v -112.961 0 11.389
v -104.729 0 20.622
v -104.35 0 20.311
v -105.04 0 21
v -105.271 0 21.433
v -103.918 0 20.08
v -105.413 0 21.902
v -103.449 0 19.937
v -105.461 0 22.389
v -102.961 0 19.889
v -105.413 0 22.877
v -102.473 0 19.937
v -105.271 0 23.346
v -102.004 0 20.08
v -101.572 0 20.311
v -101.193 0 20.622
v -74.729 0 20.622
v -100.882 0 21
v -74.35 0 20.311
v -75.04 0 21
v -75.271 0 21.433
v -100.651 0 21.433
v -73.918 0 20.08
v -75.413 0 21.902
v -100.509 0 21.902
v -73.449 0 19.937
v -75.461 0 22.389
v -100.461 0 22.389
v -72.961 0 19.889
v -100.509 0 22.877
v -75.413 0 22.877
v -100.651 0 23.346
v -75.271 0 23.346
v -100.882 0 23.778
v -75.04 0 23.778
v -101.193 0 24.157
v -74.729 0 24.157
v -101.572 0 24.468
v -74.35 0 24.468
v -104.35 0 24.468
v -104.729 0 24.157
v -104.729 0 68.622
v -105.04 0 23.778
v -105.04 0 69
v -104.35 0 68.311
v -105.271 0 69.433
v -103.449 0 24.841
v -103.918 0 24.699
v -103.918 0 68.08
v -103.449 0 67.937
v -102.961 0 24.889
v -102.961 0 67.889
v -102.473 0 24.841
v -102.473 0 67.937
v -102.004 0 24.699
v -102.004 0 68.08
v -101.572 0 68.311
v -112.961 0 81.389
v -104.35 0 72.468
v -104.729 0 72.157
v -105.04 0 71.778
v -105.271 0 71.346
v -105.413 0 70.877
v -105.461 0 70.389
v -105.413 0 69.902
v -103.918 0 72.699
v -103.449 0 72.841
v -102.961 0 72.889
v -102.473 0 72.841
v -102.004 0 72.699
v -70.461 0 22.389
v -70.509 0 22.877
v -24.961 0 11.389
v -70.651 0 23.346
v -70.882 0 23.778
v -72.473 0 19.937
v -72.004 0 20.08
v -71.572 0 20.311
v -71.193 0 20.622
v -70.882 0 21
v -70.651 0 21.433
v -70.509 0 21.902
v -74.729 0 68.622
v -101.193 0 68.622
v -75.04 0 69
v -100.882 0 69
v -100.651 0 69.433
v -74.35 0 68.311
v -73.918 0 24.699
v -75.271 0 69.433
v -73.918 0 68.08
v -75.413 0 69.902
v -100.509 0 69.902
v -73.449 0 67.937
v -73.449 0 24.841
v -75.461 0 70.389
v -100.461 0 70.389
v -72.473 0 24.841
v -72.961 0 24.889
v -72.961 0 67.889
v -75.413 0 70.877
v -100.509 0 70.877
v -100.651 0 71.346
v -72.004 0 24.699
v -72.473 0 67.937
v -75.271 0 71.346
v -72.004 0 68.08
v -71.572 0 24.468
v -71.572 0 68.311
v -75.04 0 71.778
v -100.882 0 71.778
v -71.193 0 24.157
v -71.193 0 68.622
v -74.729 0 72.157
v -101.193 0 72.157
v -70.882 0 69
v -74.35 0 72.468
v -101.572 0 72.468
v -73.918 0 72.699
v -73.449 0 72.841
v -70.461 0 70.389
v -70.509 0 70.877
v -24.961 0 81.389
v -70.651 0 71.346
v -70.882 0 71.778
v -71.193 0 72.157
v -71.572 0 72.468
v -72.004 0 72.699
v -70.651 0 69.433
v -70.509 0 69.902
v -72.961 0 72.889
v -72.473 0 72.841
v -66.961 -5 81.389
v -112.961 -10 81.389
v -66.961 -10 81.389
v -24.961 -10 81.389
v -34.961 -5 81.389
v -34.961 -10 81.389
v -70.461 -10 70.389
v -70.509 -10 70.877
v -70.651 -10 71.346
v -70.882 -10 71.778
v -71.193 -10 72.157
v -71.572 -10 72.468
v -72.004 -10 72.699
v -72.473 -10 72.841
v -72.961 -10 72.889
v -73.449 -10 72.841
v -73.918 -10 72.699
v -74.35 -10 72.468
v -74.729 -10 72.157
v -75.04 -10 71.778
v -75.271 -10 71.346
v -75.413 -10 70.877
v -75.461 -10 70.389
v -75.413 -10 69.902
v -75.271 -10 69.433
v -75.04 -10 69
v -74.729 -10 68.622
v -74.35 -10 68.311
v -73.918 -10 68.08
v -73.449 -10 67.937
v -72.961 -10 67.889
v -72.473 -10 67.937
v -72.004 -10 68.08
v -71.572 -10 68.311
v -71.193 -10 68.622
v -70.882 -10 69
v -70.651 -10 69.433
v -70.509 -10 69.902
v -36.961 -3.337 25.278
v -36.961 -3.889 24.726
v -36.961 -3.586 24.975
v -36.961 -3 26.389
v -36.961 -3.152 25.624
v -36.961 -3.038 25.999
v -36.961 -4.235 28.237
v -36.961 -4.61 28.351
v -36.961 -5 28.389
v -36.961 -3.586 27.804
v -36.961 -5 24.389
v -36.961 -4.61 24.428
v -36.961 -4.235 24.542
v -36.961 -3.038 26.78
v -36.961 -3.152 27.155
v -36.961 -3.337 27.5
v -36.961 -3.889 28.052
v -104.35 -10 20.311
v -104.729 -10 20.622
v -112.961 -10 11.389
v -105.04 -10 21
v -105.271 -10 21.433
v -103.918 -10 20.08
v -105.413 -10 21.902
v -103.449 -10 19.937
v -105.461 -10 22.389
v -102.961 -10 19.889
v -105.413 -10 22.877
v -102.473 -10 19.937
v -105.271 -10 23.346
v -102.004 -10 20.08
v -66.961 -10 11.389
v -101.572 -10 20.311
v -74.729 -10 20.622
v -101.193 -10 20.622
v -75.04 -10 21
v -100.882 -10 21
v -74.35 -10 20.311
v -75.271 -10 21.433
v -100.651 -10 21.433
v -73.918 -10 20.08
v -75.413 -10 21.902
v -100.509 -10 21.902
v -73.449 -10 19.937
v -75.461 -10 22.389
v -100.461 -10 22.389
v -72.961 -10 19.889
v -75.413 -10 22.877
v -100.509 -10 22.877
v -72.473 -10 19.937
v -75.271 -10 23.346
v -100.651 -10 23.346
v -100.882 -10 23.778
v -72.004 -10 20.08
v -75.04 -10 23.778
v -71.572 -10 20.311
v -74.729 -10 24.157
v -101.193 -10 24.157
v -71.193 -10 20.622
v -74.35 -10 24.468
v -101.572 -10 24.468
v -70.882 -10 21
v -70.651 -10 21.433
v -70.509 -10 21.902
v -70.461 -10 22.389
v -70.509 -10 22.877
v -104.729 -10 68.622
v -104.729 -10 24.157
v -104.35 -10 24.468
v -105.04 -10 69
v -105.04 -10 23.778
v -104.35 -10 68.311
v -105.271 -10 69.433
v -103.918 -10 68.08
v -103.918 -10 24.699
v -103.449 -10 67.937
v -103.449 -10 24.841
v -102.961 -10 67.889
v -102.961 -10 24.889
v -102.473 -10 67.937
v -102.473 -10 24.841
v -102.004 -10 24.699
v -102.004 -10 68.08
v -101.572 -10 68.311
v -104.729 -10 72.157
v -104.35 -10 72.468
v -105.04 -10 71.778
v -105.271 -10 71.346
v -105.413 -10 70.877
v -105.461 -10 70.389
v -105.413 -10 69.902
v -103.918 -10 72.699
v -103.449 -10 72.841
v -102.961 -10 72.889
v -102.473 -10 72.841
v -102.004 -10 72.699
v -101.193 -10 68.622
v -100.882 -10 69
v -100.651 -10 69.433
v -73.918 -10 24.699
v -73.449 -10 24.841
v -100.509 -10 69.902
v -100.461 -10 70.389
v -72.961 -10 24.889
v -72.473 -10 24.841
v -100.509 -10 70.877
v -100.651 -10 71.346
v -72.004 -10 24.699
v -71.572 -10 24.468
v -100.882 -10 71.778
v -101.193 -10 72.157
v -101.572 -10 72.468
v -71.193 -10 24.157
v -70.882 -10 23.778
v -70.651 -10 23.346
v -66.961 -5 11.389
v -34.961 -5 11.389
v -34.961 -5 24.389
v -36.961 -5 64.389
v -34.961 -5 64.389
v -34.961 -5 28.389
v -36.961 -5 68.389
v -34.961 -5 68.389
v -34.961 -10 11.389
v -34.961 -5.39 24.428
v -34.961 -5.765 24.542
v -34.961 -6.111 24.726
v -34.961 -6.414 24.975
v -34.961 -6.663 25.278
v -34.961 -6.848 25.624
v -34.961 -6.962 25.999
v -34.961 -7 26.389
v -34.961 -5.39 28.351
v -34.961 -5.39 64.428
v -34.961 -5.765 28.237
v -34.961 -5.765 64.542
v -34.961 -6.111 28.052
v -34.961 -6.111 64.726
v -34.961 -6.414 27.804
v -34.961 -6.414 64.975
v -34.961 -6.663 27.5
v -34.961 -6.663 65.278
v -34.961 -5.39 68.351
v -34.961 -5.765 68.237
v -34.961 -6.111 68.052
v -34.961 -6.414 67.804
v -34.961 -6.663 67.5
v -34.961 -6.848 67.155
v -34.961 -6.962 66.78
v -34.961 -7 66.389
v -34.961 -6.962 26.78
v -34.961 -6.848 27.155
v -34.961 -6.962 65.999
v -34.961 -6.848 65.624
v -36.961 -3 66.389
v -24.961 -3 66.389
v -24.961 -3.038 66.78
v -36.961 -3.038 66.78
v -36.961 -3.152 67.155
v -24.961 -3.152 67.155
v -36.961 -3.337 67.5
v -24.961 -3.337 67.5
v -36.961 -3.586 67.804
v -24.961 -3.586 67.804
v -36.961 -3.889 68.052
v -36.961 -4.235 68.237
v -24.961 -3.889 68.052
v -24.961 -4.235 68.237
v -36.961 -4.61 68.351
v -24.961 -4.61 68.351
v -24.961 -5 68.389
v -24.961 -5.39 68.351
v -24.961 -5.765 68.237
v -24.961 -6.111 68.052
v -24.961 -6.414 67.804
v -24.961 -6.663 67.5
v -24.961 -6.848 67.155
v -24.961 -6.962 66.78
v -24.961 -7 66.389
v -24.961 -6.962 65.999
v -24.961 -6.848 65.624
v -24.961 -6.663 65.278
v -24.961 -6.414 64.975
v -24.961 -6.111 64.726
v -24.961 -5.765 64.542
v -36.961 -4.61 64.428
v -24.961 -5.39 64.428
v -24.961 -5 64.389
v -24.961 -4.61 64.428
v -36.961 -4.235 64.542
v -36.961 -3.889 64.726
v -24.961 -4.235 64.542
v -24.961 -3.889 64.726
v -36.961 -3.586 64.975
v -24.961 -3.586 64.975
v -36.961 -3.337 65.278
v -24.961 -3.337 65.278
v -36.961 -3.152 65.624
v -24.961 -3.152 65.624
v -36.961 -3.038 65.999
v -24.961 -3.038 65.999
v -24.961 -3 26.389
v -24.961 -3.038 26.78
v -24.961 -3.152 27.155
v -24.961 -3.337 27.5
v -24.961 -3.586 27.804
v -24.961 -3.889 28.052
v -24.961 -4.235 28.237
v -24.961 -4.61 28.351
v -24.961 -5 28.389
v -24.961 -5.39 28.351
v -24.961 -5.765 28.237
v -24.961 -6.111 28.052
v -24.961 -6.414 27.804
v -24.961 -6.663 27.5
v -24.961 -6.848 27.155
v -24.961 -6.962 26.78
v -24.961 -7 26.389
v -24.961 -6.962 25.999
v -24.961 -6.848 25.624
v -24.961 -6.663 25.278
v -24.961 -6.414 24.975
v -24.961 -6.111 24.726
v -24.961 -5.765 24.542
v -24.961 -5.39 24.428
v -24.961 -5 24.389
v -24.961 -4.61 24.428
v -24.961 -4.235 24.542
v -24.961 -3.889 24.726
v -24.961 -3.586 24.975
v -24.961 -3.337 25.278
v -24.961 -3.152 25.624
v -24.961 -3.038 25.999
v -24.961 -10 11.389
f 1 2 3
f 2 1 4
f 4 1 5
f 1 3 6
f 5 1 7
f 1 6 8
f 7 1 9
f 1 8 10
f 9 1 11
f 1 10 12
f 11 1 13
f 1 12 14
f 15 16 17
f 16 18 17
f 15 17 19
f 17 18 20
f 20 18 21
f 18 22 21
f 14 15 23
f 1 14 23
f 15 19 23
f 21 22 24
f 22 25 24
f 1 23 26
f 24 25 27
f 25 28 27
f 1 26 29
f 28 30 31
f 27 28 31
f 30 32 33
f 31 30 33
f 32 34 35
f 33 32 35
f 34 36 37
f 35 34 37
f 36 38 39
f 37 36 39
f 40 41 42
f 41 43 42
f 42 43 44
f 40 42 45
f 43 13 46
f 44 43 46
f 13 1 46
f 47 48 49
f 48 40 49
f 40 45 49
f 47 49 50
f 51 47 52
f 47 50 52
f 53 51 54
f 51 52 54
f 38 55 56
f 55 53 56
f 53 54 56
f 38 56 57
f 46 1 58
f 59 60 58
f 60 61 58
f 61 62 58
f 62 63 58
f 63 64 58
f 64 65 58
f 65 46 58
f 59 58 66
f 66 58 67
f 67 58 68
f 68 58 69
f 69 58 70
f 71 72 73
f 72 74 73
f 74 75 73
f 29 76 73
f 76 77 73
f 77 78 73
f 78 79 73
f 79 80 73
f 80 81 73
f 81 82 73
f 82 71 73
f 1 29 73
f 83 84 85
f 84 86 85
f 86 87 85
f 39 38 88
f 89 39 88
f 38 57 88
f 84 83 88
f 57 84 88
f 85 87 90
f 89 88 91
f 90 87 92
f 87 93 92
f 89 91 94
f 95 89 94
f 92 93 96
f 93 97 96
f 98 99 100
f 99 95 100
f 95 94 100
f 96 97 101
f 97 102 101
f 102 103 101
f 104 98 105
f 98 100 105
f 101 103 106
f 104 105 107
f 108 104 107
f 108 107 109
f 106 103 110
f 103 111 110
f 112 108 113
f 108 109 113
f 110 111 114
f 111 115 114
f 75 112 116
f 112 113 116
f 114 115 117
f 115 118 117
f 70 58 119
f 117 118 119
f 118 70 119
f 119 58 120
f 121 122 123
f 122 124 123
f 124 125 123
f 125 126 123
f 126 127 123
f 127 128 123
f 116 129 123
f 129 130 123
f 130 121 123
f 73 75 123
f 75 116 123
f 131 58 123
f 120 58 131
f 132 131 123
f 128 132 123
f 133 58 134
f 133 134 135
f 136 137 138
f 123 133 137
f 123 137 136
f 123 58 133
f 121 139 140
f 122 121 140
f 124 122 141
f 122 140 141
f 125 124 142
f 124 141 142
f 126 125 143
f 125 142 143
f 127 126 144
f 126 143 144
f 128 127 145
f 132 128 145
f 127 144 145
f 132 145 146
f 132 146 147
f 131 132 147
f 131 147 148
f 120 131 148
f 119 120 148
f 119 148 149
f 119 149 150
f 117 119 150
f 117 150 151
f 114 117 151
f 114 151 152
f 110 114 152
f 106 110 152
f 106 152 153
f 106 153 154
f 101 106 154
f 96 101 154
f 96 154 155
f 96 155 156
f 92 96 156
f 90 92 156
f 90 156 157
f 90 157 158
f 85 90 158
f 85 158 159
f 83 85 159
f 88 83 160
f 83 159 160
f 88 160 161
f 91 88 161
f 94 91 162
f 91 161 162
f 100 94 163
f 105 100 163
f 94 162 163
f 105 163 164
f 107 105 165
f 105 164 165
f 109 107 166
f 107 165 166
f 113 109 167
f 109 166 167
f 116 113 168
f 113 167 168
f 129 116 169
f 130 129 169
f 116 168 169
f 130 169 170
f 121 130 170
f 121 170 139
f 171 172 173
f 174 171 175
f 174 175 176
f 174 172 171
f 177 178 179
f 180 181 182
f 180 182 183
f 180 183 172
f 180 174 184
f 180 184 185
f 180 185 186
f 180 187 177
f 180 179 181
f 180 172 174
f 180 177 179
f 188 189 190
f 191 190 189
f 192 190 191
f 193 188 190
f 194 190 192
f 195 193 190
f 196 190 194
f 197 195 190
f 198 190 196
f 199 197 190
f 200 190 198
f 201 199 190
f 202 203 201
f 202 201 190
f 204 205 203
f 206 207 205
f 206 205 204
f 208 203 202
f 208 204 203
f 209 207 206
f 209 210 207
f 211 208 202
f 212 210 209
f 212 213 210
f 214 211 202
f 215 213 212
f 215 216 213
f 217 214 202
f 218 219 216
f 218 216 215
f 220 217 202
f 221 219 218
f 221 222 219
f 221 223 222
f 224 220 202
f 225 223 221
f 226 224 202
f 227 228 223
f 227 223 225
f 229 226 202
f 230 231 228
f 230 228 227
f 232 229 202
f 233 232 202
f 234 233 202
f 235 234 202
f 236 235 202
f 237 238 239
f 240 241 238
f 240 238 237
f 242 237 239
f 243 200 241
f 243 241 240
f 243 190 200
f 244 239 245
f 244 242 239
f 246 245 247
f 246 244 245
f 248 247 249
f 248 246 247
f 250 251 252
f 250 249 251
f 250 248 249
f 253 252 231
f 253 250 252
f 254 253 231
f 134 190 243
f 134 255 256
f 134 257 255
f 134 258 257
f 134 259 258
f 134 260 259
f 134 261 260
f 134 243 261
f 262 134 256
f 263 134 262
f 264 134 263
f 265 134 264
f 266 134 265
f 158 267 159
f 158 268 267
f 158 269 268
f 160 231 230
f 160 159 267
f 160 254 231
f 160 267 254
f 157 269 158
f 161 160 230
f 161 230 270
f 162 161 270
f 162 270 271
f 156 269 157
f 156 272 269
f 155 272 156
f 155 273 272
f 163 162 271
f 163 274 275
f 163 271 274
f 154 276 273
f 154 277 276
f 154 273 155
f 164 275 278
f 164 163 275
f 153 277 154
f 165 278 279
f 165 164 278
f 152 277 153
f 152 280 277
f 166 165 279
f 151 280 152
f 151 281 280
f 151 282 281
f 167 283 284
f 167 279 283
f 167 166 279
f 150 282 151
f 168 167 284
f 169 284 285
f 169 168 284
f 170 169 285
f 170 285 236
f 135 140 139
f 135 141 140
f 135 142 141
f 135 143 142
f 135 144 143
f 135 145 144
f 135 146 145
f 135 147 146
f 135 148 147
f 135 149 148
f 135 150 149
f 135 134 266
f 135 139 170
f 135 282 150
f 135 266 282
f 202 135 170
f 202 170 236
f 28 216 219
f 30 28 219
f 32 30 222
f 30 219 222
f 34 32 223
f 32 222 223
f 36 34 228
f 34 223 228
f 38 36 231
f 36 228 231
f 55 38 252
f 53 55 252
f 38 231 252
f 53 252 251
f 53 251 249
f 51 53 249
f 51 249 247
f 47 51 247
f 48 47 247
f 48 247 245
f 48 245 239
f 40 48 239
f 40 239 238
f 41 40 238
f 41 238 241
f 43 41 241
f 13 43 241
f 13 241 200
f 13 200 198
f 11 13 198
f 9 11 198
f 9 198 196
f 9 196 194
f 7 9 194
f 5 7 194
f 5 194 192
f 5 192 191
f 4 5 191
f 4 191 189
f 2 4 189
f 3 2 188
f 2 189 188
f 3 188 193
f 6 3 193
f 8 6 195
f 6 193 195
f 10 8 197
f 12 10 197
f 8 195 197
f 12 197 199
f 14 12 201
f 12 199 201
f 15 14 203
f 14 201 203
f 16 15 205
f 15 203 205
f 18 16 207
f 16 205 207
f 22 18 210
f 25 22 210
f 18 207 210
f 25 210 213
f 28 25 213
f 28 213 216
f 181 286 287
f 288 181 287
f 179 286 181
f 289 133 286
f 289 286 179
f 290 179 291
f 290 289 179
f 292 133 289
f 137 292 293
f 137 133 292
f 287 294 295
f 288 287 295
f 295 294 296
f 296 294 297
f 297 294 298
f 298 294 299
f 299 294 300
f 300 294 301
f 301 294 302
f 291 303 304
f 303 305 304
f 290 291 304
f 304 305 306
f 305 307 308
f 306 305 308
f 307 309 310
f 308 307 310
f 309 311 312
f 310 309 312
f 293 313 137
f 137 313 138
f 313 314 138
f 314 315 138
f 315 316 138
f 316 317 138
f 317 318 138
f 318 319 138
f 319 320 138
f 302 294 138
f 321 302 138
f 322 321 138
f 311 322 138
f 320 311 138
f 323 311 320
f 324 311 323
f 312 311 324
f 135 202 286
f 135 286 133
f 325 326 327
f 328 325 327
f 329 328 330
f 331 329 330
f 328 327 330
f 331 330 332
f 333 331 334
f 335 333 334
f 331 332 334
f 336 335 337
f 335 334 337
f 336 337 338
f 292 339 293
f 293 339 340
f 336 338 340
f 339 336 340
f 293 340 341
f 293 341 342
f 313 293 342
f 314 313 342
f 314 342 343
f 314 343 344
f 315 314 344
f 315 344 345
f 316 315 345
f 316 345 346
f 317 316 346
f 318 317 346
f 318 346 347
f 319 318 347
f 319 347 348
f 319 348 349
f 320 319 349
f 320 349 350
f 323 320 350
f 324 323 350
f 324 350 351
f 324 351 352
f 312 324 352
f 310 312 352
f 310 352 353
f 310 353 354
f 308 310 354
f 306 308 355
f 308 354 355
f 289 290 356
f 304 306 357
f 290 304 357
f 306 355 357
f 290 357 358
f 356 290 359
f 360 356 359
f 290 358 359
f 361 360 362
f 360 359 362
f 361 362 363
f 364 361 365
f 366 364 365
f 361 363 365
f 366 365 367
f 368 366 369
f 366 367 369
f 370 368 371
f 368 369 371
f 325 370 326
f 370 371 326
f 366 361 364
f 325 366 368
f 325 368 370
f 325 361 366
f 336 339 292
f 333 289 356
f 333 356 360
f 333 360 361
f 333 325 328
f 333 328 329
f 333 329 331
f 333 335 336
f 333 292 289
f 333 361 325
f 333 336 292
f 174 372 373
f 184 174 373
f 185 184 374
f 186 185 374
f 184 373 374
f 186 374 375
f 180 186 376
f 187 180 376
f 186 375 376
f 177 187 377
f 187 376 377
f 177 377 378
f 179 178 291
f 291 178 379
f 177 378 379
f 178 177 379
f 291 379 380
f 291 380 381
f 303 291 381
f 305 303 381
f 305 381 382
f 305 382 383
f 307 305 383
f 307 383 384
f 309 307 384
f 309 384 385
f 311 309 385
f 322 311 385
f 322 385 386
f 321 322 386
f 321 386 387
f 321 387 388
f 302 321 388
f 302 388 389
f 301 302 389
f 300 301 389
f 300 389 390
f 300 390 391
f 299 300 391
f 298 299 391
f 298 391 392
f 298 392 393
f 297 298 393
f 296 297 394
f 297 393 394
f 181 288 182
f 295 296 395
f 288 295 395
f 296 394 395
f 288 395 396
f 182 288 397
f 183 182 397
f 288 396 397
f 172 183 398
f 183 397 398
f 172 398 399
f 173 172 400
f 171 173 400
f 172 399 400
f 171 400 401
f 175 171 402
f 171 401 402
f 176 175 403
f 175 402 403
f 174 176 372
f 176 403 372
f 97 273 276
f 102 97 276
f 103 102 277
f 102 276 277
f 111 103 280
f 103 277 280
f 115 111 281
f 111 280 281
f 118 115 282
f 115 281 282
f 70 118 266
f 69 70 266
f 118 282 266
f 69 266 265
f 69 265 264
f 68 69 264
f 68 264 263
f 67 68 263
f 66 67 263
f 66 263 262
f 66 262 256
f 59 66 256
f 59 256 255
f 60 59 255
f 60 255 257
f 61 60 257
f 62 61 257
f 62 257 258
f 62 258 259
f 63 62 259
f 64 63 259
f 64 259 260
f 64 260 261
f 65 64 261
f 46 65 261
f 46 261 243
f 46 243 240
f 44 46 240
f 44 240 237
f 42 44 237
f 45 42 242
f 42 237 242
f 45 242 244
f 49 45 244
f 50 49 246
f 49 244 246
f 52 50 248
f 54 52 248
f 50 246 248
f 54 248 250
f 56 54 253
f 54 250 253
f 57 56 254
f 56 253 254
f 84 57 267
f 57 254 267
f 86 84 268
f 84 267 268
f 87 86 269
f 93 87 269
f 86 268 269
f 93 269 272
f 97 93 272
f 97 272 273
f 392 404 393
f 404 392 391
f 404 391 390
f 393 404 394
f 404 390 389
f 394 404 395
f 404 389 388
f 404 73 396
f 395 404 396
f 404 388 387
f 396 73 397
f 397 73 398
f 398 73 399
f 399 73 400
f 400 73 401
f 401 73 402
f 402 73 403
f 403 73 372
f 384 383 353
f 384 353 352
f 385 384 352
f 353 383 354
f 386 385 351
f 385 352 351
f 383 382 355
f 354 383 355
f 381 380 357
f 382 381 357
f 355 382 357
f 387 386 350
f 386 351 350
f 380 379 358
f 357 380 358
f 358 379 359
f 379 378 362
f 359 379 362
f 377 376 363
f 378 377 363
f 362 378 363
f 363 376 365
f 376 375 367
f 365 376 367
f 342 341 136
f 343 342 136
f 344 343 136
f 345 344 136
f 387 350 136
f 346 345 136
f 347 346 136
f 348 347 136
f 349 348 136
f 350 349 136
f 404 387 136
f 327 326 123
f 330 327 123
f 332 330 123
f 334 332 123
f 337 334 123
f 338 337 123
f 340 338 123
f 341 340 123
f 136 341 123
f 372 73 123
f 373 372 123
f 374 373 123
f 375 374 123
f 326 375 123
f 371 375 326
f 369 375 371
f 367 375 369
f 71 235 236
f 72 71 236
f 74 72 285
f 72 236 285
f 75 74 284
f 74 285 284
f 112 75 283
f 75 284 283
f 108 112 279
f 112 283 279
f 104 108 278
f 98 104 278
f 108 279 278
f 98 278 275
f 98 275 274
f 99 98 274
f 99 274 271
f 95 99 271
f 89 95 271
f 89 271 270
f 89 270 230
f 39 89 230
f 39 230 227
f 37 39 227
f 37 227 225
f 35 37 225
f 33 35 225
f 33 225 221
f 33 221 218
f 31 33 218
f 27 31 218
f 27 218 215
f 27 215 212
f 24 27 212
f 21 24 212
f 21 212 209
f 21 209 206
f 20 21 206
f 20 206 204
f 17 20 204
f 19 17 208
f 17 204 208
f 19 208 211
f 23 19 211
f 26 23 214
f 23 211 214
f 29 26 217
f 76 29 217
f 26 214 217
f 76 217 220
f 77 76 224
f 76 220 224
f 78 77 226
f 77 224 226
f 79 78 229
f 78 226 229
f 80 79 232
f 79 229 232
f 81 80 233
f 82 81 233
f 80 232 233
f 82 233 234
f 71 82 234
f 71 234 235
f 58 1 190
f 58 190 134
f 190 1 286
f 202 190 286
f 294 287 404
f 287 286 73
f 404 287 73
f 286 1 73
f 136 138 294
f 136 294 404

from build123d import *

# Parameters (mm, degrees)
F0_W     = 88
F0_H     = 70
F1_DEPTH = 10
F2_W     = 32
F2_H     = 70
F3_DEPTH = 5
F2_R     = 2.5
F4_DEPTH = 10.001
F5_R     = 2
F6_DEPTH = 12


with BuildPart() as f1:
    # F0 (on Front) → F1 (new body)
    with BuildSketch(Plane.XZ):
        with Locations((-68.961055, 46.389333)):
            Rectangle(F0_W, F0_H)
    extrude(amount=F1_DEPTH)

    # F2 (on face) → F3 (cut)
    with BuildSketch(Plane.XZ.offset(10)):
        with Locations((-50.961055, 46.389333)):
            Rectangle(F2_W, F2_H)
    extrude(amount=-F3_DEPTH, mode=Mode.SUBTRACT)

    # F2 (on face) → F4 (cut, through all)
    with BuildSketch(Plane.XZ.offset(10)):
        with Locations((-102.961055, 70.389333)):
            Circle(F2_R)
        with Locations((-72.961055, 70.389333)):
            Circle(F2_R)
        with Locations((-102.961055, 22.389333)):
            Circle(F2_R)
        with Locations((-72.961055, 22.389333)):
            Circle(F2_R)
    extrude(amount=-F4_DEPTH, mode=Mode.SUBTRACT)

    # F5 (on face) → F6 (cut)
    with BuildSketch(Plane.YZ.offset(-24.961055)):
        with Locations((-5, 26.389333)):
            Circle(F5_R)
        with Locations((-5, 66.389333)):
            Circle(F5_R)
    extrude(amount=-F6_DEPTH, mode=Mode.SUBTRACT)


solid = f1.part
